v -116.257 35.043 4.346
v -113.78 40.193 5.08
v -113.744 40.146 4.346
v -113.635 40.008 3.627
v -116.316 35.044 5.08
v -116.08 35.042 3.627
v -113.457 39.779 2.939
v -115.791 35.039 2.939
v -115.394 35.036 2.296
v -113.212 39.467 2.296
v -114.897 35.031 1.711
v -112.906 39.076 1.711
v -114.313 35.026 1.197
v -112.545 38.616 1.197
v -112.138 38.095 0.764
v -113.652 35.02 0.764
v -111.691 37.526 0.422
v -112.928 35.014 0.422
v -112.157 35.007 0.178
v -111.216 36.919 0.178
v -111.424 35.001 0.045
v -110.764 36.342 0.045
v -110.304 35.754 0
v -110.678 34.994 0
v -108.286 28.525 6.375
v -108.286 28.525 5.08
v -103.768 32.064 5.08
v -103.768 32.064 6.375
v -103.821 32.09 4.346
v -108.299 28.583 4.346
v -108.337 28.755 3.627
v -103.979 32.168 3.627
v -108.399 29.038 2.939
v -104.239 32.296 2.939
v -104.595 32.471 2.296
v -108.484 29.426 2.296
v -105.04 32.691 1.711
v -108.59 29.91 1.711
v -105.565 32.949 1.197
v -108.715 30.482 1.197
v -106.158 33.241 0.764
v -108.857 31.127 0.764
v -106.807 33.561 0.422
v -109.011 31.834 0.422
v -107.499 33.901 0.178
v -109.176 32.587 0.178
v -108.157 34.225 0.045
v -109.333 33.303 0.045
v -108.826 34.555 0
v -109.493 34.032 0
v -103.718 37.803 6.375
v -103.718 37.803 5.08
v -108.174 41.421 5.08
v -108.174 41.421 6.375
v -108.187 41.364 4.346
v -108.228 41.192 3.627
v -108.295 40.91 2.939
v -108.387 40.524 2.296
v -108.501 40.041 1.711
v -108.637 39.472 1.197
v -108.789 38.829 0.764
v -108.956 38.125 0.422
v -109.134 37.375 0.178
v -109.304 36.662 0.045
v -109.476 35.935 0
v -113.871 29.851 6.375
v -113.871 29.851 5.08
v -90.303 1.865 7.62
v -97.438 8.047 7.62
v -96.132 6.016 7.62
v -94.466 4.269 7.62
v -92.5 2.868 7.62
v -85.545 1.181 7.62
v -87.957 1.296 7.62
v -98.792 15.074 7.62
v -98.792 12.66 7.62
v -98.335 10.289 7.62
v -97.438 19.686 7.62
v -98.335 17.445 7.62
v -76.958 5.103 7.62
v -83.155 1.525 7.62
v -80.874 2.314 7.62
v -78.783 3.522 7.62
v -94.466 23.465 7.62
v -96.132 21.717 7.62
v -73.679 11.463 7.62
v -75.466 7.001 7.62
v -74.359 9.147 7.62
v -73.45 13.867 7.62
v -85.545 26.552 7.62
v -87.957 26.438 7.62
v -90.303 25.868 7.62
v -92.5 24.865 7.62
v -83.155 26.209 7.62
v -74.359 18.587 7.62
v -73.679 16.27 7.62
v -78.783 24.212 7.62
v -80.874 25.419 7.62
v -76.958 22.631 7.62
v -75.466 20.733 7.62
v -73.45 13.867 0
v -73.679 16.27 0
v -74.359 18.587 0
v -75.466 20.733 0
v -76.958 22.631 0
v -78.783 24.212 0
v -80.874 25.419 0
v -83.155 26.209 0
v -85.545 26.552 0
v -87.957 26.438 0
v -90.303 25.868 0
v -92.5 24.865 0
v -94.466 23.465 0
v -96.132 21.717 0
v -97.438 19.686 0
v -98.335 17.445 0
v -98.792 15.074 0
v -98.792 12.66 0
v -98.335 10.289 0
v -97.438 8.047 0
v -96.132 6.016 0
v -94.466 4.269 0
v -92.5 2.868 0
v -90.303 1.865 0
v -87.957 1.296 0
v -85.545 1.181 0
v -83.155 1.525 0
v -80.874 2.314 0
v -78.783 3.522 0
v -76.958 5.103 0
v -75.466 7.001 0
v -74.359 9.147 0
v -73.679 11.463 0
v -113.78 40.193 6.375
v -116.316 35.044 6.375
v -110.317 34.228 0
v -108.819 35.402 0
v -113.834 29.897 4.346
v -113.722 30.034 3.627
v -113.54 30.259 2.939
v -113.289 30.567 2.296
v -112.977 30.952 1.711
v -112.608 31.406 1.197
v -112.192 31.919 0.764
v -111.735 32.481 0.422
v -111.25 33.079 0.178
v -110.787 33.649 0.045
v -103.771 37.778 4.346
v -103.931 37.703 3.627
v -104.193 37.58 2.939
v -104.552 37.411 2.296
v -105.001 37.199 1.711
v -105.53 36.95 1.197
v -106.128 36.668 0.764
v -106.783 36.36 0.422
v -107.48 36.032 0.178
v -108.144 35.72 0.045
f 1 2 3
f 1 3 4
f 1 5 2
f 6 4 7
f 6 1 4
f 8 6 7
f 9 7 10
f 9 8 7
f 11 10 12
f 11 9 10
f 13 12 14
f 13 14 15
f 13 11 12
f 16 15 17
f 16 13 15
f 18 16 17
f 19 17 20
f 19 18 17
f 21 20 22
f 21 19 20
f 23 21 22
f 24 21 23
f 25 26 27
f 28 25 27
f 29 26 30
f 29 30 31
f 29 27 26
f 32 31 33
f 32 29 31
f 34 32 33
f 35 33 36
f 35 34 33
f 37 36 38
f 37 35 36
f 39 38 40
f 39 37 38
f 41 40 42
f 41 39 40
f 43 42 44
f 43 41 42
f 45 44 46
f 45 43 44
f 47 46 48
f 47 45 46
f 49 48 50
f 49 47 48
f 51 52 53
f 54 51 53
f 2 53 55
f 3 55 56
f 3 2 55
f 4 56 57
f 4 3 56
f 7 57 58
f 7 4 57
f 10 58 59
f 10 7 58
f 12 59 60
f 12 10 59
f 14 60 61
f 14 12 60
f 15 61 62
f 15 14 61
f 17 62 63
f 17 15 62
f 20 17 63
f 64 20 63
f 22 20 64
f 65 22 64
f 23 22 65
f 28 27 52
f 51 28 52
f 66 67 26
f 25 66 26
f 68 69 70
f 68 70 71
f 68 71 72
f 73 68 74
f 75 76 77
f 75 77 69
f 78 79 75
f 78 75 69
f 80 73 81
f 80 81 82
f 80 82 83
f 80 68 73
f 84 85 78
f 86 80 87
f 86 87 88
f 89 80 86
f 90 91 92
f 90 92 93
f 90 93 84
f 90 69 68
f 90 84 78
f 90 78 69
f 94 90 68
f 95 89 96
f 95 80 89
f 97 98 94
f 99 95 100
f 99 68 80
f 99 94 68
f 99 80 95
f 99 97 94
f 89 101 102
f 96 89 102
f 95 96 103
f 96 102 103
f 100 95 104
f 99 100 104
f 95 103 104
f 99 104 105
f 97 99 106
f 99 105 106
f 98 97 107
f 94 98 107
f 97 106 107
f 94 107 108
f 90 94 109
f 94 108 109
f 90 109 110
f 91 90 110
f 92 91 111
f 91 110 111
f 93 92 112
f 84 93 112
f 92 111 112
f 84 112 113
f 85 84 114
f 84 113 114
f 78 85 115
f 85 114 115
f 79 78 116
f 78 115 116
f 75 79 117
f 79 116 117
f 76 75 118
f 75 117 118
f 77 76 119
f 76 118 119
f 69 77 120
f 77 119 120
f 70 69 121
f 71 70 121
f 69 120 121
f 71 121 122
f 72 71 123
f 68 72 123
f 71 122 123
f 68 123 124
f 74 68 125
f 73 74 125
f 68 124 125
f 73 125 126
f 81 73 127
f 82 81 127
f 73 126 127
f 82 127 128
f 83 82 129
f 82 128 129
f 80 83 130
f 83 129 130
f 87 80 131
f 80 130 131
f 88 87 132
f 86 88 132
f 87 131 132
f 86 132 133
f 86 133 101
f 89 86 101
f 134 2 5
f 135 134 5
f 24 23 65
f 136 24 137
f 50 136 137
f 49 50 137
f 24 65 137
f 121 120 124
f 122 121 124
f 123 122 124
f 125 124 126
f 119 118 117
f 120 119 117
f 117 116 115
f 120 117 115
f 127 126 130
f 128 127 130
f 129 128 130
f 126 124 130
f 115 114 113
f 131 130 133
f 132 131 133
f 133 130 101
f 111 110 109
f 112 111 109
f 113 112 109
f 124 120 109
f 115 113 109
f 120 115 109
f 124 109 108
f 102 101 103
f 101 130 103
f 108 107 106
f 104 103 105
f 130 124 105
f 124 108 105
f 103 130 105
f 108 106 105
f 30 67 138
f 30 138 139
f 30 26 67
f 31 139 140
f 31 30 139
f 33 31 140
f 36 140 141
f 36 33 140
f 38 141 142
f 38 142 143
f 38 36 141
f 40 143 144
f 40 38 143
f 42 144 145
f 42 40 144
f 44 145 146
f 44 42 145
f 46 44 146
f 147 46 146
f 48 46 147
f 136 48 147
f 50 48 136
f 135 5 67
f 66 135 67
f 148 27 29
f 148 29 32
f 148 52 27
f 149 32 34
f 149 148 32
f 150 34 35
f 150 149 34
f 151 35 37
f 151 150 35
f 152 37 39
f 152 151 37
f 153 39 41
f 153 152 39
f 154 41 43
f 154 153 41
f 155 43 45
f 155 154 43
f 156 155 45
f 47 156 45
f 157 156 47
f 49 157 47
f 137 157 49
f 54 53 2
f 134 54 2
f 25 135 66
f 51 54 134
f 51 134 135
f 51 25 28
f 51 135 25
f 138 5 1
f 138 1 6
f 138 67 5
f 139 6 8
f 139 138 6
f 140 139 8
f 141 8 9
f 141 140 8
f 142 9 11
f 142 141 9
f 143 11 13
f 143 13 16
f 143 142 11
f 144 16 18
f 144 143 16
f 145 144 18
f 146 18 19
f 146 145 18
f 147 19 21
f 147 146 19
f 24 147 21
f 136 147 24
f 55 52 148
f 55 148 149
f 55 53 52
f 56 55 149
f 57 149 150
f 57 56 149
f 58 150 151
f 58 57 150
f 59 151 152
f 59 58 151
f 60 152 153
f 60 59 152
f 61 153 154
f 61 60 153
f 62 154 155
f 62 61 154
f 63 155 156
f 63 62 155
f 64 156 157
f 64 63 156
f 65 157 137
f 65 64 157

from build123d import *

# Parameters (mm, degrees)
F0_R     = 12.7
F1_DEPTH = 7.62
F3_DEPTH = 6.3754
F4_R     = 5.08


with BuildPart() as f1:
    # F0 (on Top) → F1 (new body)
    with BuildSketch(Plane.XY):
        with Locations((-86.149625, 13.866776)):
            Circle(F0_R)
    extrude(amount=F1_DEPTH)


with BuildPart() as f3:
    # F2 (on Top) → F3 (new body)
    with BuildSketch(Plane.XY):
        Polygon((-108.173678, 41.421226), (-113.780443, 40.193), (-116.315938, 35.043669), (-113.870884, 29.850783), (-108.286457, 28.524692), (-103.767843, 32.063969), (-103.717652, 37.803466), align=None)
    extrude(amount=F3_DEPTH)

    # F4
    f4_edges = [f3.edges().sort_by_distance(p)[0] for p in [
        (-110.97706, 40.807113, 0),
        (-115.048191, 37.618334, 0),
        (-115.093411, 32.447226, 0),
        (-111.07867, 29.187737, 0),
        (-106.02715, 30.29433, 0),
        (-103.742747, 34.933718, 0),
        (-105.945665, 39.612346, 0),
    ]]
    fillet(f4_edges, radius=F4_R)


solid = Compound([f1.part, f3.part])
